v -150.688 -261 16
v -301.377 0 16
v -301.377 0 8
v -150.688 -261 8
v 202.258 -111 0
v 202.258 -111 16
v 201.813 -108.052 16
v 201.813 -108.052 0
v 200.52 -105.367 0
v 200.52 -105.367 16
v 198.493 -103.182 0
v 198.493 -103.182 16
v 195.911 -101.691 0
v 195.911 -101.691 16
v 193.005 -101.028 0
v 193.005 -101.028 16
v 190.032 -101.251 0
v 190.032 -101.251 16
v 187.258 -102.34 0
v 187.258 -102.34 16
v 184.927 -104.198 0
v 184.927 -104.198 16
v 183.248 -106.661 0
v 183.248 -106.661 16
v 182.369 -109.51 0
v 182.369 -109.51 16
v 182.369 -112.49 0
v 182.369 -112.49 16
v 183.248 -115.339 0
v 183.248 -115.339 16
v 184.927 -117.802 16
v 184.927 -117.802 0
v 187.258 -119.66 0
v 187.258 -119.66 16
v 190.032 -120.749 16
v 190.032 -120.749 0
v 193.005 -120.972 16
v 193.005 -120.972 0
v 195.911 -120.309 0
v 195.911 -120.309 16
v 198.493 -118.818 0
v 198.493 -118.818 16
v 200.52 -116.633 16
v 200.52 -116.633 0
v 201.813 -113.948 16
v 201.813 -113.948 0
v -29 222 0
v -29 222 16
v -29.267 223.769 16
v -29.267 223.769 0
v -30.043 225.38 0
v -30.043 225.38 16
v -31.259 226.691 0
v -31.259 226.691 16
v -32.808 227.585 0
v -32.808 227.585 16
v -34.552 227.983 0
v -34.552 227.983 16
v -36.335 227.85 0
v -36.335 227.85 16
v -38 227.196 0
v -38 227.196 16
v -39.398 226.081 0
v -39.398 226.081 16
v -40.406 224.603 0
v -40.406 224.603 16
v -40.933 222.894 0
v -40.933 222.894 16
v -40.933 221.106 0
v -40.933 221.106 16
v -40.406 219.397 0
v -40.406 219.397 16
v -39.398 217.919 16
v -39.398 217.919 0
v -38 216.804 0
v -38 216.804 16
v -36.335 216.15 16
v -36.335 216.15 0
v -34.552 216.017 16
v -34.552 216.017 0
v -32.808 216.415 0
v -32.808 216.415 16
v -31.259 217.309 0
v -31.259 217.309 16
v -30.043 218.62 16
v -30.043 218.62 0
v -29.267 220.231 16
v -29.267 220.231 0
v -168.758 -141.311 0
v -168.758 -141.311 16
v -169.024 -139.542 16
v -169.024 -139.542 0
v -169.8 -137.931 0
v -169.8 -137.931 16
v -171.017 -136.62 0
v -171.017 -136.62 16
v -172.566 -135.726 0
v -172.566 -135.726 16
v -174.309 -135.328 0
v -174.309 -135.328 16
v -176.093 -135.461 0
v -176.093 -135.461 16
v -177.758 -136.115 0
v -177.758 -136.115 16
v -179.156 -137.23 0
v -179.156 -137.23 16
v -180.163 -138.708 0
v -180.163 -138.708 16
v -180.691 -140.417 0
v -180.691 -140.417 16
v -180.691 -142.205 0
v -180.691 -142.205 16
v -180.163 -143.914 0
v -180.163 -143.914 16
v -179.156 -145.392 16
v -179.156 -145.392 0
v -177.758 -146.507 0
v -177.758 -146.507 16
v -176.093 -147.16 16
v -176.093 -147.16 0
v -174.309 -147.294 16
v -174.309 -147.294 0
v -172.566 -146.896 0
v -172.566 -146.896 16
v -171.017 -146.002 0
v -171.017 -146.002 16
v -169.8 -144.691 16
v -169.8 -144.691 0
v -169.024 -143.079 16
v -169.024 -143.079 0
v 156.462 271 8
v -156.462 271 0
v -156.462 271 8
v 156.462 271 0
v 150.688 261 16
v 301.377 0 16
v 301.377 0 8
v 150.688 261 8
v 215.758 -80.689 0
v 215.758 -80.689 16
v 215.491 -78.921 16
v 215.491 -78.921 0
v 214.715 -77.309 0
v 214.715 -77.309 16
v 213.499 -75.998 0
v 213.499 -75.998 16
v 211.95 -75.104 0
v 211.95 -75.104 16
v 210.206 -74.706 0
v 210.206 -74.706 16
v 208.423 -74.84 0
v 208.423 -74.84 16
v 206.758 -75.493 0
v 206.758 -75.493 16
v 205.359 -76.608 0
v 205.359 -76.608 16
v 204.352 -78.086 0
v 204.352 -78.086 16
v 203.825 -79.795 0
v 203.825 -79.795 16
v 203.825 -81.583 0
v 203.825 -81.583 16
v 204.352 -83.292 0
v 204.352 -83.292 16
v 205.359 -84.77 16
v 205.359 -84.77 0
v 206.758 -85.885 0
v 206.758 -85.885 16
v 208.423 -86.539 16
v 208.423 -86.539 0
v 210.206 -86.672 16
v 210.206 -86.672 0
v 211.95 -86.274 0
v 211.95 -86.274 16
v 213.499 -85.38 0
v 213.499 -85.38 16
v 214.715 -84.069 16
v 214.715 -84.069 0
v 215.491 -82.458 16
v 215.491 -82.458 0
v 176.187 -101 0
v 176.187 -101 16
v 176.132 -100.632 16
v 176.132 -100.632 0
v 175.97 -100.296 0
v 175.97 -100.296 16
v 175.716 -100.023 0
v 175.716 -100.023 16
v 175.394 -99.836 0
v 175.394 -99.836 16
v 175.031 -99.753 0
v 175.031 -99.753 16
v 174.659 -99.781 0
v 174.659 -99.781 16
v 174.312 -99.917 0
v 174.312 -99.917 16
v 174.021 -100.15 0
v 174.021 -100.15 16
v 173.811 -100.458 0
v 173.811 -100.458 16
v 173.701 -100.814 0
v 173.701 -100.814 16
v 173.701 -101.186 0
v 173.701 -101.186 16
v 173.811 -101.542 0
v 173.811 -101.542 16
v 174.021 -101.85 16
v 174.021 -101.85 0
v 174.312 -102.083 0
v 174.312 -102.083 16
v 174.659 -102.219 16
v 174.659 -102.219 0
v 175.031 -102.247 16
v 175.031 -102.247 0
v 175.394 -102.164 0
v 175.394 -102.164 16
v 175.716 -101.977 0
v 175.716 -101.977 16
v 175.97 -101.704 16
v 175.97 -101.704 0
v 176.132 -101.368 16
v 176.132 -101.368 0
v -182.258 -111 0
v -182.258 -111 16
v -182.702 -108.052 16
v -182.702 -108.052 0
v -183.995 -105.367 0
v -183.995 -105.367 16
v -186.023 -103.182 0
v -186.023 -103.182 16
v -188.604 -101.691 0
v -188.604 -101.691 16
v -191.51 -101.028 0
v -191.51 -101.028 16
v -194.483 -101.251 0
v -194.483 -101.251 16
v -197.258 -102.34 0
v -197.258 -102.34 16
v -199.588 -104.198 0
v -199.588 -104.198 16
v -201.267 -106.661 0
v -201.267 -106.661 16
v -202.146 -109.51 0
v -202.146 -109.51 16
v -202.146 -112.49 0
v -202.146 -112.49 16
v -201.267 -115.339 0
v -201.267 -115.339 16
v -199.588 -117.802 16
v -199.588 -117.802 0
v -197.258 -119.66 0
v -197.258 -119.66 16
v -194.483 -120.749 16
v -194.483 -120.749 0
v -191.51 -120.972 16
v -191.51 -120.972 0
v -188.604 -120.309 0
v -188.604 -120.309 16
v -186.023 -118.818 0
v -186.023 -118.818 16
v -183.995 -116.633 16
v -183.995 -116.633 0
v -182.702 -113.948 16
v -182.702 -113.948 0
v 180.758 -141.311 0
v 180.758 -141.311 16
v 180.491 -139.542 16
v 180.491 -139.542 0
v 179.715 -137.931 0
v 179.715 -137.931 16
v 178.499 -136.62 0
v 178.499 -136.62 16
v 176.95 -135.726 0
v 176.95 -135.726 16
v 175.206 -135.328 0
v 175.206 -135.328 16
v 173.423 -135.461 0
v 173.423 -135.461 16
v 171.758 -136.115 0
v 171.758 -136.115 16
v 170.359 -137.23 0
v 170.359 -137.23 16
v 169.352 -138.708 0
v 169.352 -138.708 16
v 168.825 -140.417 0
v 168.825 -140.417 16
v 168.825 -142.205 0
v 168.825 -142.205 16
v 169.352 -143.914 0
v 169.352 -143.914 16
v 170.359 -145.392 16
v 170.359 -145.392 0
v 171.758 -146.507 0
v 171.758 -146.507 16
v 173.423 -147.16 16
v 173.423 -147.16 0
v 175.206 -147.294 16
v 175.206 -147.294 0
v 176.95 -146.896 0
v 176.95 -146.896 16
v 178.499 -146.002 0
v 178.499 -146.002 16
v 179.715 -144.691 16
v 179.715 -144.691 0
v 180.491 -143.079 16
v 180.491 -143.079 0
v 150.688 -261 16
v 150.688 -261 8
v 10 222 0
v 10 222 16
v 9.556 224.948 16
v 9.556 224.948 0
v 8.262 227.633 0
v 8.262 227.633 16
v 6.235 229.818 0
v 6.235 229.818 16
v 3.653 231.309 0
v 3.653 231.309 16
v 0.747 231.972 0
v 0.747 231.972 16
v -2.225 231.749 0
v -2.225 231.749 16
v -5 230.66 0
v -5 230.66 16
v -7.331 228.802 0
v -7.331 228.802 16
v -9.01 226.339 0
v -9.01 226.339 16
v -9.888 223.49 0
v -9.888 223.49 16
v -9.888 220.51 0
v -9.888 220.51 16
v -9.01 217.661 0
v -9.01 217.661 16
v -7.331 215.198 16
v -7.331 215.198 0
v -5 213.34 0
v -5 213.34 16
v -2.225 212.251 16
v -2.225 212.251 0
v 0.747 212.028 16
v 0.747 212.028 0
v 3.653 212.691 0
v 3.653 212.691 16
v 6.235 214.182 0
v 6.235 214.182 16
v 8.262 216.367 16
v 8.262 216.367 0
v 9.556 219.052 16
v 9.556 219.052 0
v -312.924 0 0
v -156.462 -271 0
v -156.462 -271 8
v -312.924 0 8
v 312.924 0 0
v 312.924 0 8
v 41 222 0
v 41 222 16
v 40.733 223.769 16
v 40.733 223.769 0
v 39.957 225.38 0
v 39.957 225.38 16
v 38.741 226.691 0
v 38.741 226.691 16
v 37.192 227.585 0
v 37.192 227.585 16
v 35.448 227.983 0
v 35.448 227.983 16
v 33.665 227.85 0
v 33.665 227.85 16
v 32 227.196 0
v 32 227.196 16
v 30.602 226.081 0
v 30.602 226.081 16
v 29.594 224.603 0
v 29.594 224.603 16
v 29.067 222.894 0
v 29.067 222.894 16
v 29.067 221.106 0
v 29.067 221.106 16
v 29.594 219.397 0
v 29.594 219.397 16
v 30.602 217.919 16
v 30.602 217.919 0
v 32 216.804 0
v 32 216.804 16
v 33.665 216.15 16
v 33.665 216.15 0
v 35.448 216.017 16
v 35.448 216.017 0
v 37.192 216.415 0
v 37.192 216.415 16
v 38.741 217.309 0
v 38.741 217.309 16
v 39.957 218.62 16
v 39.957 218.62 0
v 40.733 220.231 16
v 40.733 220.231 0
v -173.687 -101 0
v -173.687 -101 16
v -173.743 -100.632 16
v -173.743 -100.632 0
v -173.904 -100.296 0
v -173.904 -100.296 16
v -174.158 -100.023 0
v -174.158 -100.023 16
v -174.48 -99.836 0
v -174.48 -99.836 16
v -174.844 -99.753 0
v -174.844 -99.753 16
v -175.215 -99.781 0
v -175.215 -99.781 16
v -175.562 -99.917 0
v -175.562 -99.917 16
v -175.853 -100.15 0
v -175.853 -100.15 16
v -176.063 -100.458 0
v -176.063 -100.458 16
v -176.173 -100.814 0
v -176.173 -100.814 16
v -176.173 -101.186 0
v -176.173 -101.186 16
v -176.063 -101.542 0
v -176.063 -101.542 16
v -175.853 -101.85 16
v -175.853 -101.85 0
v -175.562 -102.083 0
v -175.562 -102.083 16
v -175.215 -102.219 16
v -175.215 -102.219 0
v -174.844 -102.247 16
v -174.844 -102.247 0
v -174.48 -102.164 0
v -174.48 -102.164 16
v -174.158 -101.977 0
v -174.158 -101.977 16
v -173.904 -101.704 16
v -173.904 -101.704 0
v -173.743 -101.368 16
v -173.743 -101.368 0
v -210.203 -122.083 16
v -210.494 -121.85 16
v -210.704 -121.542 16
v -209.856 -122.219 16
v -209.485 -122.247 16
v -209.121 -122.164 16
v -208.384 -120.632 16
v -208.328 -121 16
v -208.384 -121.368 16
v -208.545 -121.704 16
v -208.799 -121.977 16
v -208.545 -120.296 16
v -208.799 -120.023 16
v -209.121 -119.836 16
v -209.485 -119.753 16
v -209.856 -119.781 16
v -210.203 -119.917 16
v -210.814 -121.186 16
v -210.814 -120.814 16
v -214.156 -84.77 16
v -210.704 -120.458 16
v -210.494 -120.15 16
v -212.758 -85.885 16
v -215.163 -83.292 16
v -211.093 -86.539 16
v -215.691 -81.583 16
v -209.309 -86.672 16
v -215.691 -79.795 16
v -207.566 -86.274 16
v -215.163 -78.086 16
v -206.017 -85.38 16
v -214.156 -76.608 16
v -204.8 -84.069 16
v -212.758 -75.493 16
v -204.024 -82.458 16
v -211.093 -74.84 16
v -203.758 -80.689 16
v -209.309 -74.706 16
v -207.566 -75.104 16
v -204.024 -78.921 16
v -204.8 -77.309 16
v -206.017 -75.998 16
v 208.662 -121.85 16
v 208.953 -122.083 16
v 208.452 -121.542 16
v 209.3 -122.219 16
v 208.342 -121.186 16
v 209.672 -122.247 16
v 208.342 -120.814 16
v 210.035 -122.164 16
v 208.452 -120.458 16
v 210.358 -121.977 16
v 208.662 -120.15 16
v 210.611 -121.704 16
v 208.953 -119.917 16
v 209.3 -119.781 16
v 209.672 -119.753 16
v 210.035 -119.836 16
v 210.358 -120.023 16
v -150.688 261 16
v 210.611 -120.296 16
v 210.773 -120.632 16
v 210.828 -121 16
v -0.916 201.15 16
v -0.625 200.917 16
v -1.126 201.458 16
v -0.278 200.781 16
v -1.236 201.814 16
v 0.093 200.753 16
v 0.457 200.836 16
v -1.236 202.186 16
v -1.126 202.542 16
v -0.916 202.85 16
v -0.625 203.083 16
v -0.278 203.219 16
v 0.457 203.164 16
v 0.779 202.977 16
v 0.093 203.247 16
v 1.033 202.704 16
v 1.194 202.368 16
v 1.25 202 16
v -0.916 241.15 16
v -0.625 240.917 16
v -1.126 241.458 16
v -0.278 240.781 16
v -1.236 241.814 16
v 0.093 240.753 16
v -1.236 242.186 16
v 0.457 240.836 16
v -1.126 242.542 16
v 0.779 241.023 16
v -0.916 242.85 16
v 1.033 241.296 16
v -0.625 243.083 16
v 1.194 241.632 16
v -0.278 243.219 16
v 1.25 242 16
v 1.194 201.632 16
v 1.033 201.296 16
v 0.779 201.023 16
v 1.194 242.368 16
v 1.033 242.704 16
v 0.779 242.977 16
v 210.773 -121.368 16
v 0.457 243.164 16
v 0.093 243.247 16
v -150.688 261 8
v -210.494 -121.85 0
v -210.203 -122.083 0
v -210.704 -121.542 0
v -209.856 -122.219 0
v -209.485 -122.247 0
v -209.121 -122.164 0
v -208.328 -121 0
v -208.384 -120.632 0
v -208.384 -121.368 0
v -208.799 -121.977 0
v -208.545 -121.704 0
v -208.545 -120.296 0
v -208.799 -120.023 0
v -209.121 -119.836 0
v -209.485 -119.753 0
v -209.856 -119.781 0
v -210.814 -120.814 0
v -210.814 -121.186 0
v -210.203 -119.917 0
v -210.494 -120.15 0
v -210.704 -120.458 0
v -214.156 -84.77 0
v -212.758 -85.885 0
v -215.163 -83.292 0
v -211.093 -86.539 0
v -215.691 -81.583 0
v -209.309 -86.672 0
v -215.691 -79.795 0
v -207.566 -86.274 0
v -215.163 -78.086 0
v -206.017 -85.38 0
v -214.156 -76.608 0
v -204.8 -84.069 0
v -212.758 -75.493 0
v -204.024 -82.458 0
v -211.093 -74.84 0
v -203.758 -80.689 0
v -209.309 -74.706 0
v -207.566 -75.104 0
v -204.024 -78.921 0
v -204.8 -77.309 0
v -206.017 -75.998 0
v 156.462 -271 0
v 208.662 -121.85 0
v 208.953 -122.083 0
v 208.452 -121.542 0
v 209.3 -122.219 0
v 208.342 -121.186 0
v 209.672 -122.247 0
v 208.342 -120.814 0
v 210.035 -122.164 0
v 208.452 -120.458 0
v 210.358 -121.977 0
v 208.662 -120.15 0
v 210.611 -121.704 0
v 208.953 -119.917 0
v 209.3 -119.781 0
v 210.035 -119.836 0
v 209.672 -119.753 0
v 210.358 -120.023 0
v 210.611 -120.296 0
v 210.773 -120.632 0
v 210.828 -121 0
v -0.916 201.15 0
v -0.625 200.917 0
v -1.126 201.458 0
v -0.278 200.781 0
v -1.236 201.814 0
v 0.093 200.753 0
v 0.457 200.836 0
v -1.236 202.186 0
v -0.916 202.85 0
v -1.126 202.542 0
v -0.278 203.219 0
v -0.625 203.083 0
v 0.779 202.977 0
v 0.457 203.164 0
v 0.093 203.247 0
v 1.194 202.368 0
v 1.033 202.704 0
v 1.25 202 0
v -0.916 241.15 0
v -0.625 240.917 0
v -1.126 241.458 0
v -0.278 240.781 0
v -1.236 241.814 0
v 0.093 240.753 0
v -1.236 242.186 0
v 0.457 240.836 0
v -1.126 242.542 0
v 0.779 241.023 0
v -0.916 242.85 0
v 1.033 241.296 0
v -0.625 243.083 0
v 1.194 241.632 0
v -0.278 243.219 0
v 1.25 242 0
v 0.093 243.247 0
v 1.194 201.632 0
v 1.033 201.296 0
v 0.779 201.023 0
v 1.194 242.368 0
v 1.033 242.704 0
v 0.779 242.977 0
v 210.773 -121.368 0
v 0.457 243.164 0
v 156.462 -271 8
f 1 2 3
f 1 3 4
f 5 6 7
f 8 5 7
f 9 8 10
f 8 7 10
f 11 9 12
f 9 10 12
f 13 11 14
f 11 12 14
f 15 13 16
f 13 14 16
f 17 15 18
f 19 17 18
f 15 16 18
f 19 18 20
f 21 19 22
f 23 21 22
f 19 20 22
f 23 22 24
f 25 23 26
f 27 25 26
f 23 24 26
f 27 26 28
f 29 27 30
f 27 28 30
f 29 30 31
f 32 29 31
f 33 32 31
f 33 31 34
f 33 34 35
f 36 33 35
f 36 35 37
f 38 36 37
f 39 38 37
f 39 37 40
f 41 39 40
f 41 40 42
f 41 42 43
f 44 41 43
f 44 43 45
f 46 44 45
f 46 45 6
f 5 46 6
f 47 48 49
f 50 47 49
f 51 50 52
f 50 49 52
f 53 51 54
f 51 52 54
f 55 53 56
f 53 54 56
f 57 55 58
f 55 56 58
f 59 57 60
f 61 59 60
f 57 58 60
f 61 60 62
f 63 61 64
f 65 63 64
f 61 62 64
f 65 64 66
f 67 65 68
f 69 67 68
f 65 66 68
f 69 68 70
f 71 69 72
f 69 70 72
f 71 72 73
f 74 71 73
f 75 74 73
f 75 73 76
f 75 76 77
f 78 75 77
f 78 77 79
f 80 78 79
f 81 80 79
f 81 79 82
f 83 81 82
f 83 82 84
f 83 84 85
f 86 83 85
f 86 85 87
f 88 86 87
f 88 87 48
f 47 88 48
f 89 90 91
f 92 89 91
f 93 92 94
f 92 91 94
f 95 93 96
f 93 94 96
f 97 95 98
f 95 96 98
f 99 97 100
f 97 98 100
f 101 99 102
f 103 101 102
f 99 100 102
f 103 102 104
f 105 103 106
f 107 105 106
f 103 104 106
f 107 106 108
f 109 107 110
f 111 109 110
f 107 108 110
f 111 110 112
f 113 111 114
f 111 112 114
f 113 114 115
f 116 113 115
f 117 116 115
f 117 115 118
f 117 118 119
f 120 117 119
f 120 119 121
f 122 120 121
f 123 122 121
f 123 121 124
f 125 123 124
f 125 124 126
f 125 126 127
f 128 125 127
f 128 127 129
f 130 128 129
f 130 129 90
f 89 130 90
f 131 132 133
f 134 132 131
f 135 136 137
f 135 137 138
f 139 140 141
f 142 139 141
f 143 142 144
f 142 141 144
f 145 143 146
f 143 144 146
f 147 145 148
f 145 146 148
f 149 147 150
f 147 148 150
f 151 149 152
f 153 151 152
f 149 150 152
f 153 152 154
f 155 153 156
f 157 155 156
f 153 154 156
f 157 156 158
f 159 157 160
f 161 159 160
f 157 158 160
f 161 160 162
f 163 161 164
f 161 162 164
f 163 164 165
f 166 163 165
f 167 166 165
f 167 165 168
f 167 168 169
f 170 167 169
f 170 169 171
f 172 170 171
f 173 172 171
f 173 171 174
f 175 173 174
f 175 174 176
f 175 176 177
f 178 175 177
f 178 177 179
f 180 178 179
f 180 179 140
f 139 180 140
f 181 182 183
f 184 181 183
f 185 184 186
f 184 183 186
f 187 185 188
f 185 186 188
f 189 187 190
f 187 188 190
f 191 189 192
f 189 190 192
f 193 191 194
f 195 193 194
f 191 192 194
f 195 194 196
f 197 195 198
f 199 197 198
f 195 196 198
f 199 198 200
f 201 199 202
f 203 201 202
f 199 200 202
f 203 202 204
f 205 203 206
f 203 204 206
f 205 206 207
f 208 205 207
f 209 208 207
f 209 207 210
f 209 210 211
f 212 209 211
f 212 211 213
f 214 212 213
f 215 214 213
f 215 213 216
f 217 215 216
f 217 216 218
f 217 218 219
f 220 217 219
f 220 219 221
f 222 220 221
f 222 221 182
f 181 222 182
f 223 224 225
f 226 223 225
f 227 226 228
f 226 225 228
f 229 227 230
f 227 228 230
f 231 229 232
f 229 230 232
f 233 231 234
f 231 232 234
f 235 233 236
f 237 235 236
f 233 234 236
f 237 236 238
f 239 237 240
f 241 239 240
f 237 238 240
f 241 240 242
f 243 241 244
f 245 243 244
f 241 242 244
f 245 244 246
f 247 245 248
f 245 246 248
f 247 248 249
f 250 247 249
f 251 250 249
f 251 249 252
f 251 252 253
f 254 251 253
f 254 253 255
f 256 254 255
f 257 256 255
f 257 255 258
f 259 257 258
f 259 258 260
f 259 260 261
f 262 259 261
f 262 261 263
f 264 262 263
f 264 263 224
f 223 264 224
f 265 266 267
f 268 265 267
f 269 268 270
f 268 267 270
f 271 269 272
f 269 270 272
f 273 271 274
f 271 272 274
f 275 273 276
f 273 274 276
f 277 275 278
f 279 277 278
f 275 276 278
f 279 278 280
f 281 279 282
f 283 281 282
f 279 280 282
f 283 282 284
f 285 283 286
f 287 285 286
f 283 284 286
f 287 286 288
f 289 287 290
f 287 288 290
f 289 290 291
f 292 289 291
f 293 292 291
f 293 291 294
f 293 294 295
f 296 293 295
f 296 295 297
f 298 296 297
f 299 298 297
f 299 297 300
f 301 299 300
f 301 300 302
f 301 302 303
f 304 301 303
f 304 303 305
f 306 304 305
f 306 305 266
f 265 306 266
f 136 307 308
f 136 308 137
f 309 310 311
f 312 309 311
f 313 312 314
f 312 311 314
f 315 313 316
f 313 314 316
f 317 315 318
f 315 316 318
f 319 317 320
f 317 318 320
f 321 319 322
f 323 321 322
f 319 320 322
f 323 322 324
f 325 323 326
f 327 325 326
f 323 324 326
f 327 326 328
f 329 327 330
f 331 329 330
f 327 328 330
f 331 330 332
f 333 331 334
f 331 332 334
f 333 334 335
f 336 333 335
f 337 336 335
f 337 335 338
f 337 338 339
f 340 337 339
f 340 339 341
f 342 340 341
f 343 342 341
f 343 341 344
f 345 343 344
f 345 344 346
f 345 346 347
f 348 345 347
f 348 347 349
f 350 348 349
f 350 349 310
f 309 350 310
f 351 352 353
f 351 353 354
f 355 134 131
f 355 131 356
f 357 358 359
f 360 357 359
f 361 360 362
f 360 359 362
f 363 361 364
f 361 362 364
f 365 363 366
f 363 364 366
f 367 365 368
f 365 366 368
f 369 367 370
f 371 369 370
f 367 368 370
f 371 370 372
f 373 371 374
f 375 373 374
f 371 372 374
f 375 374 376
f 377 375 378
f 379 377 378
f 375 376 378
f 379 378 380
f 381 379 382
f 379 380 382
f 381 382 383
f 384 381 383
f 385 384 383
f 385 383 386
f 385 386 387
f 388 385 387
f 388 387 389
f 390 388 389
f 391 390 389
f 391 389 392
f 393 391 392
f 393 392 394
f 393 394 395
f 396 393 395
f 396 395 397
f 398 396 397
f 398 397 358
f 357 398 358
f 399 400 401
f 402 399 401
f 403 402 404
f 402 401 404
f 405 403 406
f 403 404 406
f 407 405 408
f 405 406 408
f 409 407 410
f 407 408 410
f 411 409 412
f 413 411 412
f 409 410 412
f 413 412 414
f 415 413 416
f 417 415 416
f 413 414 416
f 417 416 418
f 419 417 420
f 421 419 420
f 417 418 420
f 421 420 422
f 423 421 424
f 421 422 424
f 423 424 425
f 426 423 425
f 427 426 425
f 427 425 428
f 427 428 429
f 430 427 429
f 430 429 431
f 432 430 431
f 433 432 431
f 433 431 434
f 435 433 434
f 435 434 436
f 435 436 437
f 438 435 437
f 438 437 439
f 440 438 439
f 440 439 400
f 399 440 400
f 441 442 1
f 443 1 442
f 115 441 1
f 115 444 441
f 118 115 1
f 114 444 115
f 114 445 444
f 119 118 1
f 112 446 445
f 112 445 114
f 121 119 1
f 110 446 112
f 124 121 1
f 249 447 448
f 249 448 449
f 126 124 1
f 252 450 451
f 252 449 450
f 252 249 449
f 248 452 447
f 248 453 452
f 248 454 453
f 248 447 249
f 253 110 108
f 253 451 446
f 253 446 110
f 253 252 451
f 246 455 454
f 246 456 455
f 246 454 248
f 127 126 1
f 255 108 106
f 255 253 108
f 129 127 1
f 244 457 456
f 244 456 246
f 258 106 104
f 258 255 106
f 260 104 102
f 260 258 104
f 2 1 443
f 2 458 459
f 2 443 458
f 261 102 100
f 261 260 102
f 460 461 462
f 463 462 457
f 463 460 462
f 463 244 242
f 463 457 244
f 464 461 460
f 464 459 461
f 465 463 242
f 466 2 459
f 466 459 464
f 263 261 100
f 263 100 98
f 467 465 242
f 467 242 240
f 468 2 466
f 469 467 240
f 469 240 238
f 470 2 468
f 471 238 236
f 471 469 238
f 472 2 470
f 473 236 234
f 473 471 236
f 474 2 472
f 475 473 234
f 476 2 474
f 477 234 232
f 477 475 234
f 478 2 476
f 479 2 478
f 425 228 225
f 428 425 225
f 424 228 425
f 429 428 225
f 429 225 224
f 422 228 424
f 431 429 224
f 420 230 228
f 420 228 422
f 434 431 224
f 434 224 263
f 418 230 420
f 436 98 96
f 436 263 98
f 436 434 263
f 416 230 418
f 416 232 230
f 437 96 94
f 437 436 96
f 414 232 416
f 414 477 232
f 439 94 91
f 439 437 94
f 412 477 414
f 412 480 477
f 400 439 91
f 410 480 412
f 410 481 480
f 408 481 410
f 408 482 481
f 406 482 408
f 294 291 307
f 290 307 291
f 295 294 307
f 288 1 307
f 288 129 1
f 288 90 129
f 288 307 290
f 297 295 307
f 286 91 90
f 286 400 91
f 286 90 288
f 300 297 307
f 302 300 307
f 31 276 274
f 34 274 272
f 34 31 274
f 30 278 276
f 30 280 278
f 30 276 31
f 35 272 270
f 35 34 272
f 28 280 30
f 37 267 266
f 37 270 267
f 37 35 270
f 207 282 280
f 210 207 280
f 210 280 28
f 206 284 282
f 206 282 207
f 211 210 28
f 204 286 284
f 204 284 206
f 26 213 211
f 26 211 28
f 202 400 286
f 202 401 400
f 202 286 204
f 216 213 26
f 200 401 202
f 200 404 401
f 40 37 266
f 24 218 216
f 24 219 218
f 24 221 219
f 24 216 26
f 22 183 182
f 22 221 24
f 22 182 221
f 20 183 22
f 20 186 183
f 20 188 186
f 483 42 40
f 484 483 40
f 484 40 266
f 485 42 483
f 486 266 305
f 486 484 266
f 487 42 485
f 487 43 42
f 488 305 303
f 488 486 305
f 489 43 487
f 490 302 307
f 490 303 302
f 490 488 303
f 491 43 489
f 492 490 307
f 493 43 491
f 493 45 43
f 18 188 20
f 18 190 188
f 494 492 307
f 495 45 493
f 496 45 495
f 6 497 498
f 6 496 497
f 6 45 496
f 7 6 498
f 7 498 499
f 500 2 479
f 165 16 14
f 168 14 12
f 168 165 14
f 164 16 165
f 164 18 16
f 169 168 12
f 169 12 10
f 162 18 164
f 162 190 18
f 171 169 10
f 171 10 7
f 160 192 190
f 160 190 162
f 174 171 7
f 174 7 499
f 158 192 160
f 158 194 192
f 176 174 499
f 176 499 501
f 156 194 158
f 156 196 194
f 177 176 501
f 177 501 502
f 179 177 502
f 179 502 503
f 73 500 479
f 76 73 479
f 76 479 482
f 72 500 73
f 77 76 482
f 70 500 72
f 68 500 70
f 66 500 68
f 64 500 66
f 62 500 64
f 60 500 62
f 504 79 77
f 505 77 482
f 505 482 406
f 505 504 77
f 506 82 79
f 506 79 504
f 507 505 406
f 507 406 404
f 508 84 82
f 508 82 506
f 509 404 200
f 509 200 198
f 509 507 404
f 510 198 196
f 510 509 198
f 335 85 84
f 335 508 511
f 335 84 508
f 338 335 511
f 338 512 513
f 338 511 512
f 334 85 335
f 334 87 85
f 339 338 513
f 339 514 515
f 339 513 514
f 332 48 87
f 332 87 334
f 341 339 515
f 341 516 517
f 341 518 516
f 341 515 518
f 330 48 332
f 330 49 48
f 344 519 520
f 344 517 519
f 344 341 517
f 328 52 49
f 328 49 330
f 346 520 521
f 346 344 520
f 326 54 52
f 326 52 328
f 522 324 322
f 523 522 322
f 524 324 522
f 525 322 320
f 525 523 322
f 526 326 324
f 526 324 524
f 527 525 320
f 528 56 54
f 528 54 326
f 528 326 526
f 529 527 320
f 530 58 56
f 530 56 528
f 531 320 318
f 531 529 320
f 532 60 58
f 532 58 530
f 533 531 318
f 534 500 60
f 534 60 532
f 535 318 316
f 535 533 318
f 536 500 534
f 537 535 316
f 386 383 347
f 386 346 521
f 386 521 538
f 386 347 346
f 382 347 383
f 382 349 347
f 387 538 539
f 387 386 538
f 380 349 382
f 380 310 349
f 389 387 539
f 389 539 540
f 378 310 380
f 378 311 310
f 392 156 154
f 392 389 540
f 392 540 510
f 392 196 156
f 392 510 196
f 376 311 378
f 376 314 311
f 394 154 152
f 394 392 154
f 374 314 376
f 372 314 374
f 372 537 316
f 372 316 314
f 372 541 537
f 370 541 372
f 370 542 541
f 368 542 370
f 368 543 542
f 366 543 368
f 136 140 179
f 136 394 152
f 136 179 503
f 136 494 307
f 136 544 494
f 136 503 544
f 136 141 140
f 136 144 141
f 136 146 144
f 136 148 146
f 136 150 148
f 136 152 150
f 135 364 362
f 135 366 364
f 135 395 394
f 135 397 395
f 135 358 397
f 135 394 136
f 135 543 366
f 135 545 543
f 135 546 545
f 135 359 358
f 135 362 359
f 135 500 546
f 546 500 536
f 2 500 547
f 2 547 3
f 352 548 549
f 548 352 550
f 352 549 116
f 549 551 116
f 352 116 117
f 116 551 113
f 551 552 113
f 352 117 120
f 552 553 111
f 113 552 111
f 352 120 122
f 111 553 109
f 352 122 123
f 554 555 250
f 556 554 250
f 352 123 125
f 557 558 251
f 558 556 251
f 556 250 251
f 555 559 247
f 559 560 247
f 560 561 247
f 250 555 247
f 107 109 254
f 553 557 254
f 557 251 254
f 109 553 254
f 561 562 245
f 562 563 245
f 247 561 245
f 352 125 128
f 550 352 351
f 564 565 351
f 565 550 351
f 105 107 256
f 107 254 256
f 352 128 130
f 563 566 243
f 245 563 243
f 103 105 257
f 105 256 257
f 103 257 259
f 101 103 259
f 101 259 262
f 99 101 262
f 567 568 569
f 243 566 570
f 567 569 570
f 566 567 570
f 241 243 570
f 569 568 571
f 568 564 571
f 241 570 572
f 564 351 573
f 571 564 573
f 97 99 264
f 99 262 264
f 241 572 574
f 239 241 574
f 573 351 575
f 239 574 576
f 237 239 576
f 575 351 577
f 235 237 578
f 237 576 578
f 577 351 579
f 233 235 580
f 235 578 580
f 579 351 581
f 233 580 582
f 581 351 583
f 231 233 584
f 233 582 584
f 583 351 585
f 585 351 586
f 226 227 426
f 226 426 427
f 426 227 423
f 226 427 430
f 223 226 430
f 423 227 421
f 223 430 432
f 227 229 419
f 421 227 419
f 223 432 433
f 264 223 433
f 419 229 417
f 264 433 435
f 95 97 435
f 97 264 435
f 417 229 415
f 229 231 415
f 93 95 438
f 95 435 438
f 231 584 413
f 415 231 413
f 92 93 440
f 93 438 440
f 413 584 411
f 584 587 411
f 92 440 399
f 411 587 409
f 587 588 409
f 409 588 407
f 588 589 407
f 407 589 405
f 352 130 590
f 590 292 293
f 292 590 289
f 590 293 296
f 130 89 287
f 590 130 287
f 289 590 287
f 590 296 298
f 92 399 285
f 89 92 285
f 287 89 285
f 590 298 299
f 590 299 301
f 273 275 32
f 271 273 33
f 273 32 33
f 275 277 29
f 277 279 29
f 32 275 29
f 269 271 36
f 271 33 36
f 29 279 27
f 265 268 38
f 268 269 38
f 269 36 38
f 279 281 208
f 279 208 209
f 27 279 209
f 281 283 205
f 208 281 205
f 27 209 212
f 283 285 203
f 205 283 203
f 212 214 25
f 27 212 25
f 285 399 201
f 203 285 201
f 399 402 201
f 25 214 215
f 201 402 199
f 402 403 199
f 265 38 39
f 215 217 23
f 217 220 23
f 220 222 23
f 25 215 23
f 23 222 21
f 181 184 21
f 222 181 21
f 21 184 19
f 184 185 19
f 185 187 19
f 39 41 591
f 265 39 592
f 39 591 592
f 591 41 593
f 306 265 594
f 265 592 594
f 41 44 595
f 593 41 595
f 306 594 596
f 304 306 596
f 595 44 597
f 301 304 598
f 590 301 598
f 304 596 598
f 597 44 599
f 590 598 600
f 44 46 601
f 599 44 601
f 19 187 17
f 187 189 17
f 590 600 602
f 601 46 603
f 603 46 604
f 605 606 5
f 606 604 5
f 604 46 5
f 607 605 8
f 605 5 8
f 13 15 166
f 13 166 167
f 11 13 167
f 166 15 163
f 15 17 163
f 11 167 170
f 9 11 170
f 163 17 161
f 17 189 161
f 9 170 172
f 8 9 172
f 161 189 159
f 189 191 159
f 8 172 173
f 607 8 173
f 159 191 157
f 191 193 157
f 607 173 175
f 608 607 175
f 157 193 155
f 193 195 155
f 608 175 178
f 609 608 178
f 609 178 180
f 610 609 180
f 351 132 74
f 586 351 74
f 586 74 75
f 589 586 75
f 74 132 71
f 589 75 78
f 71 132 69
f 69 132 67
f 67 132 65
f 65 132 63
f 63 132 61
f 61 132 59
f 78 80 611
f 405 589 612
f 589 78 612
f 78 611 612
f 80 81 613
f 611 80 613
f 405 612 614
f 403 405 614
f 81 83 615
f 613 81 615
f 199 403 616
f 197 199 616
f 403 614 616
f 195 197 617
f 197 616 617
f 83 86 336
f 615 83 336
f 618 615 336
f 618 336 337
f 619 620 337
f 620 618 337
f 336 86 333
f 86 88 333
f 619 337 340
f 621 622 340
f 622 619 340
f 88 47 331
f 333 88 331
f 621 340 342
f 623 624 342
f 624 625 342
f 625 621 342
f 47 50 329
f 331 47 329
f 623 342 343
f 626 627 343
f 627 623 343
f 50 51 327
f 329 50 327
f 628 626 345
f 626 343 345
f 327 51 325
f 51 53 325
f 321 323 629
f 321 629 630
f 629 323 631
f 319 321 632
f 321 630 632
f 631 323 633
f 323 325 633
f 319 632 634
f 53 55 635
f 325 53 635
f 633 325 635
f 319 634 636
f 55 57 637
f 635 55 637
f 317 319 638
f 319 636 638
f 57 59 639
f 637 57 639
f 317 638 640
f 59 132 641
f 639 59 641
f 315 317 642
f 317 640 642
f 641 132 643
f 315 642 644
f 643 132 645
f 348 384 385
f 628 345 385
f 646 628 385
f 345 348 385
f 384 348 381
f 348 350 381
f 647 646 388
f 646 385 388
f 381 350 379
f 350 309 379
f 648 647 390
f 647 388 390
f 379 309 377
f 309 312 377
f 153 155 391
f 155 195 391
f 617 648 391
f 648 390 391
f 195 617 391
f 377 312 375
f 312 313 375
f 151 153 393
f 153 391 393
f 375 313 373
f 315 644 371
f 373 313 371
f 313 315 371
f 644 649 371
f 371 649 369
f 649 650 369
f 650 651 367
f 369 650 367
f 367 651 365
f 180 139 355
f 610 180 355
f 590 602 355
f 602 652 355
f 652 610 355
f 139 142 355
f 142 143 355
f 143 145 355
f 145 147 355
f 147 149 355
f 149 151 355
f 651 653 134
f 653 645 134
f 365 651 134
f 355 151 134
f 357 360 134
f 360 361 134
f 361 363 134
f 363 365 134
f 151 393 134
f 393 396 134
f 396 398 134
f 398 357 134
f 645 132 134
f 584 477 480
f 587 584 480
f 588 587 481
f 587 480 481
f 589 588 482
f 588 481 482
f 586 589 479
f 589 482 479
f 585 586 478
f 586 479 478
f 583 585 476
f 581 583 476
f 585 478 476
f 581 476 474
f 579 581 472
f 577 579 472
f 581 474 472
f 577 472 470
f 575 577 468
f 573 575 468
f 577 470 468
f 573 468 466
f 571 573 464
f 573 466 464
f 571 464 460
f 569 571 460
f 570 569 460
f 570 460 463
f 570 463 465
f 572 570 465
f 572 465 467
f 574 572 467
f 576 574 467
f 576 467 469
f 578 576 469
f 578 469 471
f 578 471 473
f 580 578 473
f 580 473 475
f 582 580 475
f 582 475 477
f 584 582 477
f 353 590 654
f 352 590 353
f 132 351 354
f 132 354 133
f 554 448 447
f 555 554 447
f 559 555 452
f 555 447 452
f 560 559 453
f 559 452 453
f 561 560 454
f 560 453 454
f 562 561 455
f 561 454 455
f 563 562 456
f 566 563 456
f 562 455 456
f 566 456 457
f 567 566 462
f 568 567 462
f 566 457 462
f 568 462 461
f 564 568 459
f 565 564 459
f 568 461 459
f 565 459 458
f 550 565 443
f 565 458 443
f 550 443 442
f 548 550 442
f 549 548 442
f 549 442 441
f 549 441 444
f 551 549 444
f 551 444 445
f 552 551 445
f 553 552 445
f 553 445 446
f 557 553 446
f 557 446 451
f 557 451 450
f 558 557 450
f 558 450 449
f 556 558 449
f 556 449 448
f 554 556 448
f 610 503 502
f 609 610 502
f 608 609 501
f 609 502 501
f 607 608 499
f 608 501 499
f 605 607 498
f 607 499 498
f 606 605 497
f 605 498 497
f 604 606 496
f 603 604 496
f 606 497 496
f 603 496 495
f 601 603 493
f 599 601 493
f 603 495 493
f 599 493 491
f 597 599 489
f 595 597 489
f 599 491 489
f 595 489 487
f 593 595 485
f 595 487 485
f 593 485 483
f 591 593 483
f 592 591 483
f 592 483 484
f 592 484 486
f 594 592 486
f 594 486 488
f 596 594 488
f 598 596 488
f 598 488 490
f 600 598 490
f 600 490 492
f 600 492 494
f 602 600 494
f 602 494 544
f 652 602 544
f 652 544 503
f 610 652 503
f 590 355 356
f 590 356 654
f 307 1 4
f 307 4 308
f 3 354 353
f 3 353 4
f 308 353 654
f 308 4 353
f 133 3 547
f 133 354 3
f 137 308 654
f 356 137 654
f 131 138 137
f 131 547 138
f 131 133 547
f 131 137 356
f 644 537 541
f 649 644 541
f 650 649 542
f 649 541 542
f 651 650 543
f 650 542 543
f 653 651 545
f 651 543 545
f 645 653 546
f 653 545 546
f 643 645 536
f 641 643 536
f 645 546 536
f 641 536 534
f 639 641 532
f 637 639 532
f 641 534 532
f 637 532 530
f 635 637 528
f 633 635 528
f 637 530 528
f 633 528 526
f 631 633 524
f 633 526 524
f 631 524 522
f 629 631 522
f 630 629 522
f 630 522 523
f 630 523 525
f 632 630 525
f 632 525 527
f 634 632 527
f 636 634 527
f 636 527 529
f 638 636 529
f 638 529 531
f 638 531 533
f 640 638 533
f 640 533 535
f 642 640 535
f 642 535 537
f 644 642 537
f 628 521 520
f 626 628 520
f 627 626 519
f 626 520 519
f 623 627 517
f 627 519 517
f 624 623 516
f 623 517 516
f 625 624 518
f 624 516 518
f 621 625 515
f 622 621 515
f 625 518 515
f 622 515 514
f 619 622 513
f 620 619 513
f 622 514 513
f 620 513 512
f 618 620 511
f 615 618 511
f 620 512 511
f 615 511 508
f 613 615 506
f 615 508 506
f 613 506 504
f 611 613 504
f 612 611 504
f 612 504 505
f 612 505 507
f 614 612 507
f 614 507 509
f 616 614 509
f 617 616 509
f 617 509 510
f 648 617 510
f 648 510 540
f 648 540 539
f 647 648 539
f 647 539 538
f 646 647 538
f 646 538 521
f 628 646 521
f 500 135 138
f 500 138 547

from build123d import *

# Parameters (mm, degrees)
BOSS_EXTRUDE1_DEPTH = 16
CUT_EXTRUDE1_REACH  = 426.953
SKETCH3_R           = 6
SKETCH4_OUTSIDE_W   = 813.904
SKETCH4_OUTSIDE_H   = 727.89
CUT_EXTRUDE2_DEPTH  = 8
SKETCH5_R           = 1.25
SKETCH5_R_2         = 10
CUT_EXTRUDE3_DEPTH  = 425.953330771
CUT_EXTRUDE6_DEPTH  = 425.953330771


with BuildPart() as part:
    # Sketch1 → Boss-Extrude1 (new body)
    with BuildSketch(Plane.XY):
        Polygon((160.503374835, 278), (-160.503374835, 278), (-321.006749669, 0), (-160.503374835, -278), (160.503374835, -278), (321.006749669, 0), align=None)
    extrude(amount=BOSS_EXTRUDE1_DEPTH)

    # Sketch3 → Cut-Extrude1 (cut, up to next)
    with BuildSketch(Plane.XY.offset(16), mode=Mode.PRIVATE) as cut_extrude1_sk1:
        with Locations((35, 222)):
            Circle(SKETCH3_R)
    cut_extrude1_tool1 = extrude(cut_extrude1_sk1.sketch, amount=-CUT_EXTRUDE1_REACH, mode=Mode.PRIVATE) & part.part
    # Sketch3 → Cut-Extrude1 (cut, up to next)
    with BuildSketch(Plane.XY.offset(16), mode=Mode.PRIVATE) as cut_extrude1_sk2:
        with Locations((-35, 222)):
            Circle(SKETCH3_R)
    cut_extrude1_tool2 = extrude(cut_extrude1_sk2.sketch, amount=-CUT_EXTRUDE1_REACH, mode=Mode.PRIVATE) & part.part
    # Sketch3 → Cut-Extrude1 (cut, up to next)
    with BuildSketch(Plane.XY.offset(16), mode=Mode.PRIVATE) as cut_extrude1_sk3:
        with Locations((-209.75763964, -80.689110868)):
            Circle(SKETCH3_R)
    cut_extrude1_tool3 = extrude(cut_extrude1_sk3.sketch, amount=-CUT_EXTRUDE1_REACH, mode=Mode.PRIVATE) & part.part
    # Sketch3 → Cut-Extrude1 (cut, up to next)
    with BuildSketch(Plane.XY.offset(16), mode=Mode.PRIVATE) as cut_extrude1_sk4:
        with Locations((-174.75763964, -141.310889132)):
            Circle(SKETCH3_R)
    cut_extrude1_tool4 = extrude(cut_extrude1_sk4.sketch, amount=-CUT_EXTRUDE1_REACH, mode=Mode.PRIVATE) & part.part
    # Sketch3 → Cut-Extrude1 (cut, up to next)
    with BuildSketch(Plane.XY.offset(16), mode=Mode.PRIVATE) as cut_extrude1_sk5:
        with Locations((174.75763964, -141.310889132)):
            Circle(SKETCH3_R)
    cut_extrude1_tool5 = extrude(cut_extrude1_sk5.sketch, amount=-CUT_EXTRUDE1_REACH, mode=Mode.PRIVATE) & part.part
    # Sketch3 → Cut-Extrude1 (cut, up to next)
    with BuildSketch(Plane.XY.offset(16), mode=Mode.PRIVATE) as cut_extrude1_sk6:
        with Locations((209.75763964, -80.689110868)):
            Circle(SKETCH3_R)
    cut_extrude1_tool6 = extrude(cut_extrude1_sk6.sketch, amount=-CUT_EXTRUDE1_REACH, mode=Mode.PRIVATE) & part.part
    add(cut_extrude1_tool1.solids().sort_by_distance((35, 222, 16))[0], mode=Mode.SUBTRACT)
    add(cut_extrude1_tool2.solids().sort_by_distance((-35, 222, 16))[0], mode=Mode.SUBTRACT)
    add(cut_extrude1_tool3.solids().sort_by_distance((-209.75764, -80.689111, 16))[0], mode=Mode.SUBTRACT)
    add(cut_extrude1_tool4.solids().sort_by_distance((-174.75764, -141.310889, 16))[0], mode=Mode.SUBTRACT)
    add(cut_extrude1_tool5.solids().sort_by_distance((174.75764, -141.310889, 16))[0], mode=Mode.SUBTRACT)
    add(cut_extrude1_tool6.solids().sort_by_distance((209.75764, -80.689111, 16))[0], mode=Mode.SUBTRACT)

    # Sketch4 outside → Cut-Extrude2 (cut)
    with BuildSketch(Plane.XY.offset(16)):
        Rectangle(SKETCH4_OUTSIDE_W, SKETCH4_OUTSIDE_H)
        Polygon((301.376840517, 0), (150.688420258, 261), (-150.688420258, 261), (-301.376840517, 0), (-150.688420258, -261), (150.688420258, -261), align=None, mode=Mode.SUBTRACT)
    extrude(amount=-CUT_EXTRUDE2_DEPTH, mode=Mode.SUBTRACT)

    # Sketch5 → Cut-Extrude3 (cut, through all)
    with BuildSketch(Plane.XY.offset(16)):
        with Locations((209.578147716, -121)):
            Circle(SKETCH5_R)
        with Locations((174.937131564, -101)):
            Circle(SKETCH5_R)
        with Locations((-192.25763964, -111)):
            Circle(SKETCH5_R_2)
        with Locations((0, 222)):
            Circle(SKETCH5_R_2)
        with Locations((-209.578147716, -121)):
            Circle(SKETCH5_R)
        with Locations((-174.937131564, -101)):
            Circle(SKETCH5_R)
        with Locations((0, 242)):
            Circle(SKETCH5_R)
        with Locations((0, 202)):
            Circle(SKETCH5_R)
        with Locations((192.25763964, -111)):
            Circle(SKETCH5_R_2)
    extrude(amount=-CUT_EXTRUDE3_DEPTH, mode=Mode.SUBTRACT)

    # Sketch8 → Cut-Extrude6 (cut, through all)
    with BuildSketch(Plane(origin=(0, 0, 0), x_dir=(-1, 0, 0), z_dir=(0, 0, -1))):
        Polygon((160.503374835, 278), (-160.503374835, 278), (-321.006749669, 0), (-160.503374835, -278), (160.503374835, -278), (321.006749669, 0), align=None)
        Polygon((156.46192295, 271), (-156.46192295, 271), (-312.923845901, 0), (-156.46192295, -271), (156.46192295, -271), (312.923845901, 0), align=None, mode=Mode.SUBTRACT)
    extrude(amount=-CUT_EXTRUDE6_DEPTH, mode=Mode.SUBTRACT)


solid = part.part
